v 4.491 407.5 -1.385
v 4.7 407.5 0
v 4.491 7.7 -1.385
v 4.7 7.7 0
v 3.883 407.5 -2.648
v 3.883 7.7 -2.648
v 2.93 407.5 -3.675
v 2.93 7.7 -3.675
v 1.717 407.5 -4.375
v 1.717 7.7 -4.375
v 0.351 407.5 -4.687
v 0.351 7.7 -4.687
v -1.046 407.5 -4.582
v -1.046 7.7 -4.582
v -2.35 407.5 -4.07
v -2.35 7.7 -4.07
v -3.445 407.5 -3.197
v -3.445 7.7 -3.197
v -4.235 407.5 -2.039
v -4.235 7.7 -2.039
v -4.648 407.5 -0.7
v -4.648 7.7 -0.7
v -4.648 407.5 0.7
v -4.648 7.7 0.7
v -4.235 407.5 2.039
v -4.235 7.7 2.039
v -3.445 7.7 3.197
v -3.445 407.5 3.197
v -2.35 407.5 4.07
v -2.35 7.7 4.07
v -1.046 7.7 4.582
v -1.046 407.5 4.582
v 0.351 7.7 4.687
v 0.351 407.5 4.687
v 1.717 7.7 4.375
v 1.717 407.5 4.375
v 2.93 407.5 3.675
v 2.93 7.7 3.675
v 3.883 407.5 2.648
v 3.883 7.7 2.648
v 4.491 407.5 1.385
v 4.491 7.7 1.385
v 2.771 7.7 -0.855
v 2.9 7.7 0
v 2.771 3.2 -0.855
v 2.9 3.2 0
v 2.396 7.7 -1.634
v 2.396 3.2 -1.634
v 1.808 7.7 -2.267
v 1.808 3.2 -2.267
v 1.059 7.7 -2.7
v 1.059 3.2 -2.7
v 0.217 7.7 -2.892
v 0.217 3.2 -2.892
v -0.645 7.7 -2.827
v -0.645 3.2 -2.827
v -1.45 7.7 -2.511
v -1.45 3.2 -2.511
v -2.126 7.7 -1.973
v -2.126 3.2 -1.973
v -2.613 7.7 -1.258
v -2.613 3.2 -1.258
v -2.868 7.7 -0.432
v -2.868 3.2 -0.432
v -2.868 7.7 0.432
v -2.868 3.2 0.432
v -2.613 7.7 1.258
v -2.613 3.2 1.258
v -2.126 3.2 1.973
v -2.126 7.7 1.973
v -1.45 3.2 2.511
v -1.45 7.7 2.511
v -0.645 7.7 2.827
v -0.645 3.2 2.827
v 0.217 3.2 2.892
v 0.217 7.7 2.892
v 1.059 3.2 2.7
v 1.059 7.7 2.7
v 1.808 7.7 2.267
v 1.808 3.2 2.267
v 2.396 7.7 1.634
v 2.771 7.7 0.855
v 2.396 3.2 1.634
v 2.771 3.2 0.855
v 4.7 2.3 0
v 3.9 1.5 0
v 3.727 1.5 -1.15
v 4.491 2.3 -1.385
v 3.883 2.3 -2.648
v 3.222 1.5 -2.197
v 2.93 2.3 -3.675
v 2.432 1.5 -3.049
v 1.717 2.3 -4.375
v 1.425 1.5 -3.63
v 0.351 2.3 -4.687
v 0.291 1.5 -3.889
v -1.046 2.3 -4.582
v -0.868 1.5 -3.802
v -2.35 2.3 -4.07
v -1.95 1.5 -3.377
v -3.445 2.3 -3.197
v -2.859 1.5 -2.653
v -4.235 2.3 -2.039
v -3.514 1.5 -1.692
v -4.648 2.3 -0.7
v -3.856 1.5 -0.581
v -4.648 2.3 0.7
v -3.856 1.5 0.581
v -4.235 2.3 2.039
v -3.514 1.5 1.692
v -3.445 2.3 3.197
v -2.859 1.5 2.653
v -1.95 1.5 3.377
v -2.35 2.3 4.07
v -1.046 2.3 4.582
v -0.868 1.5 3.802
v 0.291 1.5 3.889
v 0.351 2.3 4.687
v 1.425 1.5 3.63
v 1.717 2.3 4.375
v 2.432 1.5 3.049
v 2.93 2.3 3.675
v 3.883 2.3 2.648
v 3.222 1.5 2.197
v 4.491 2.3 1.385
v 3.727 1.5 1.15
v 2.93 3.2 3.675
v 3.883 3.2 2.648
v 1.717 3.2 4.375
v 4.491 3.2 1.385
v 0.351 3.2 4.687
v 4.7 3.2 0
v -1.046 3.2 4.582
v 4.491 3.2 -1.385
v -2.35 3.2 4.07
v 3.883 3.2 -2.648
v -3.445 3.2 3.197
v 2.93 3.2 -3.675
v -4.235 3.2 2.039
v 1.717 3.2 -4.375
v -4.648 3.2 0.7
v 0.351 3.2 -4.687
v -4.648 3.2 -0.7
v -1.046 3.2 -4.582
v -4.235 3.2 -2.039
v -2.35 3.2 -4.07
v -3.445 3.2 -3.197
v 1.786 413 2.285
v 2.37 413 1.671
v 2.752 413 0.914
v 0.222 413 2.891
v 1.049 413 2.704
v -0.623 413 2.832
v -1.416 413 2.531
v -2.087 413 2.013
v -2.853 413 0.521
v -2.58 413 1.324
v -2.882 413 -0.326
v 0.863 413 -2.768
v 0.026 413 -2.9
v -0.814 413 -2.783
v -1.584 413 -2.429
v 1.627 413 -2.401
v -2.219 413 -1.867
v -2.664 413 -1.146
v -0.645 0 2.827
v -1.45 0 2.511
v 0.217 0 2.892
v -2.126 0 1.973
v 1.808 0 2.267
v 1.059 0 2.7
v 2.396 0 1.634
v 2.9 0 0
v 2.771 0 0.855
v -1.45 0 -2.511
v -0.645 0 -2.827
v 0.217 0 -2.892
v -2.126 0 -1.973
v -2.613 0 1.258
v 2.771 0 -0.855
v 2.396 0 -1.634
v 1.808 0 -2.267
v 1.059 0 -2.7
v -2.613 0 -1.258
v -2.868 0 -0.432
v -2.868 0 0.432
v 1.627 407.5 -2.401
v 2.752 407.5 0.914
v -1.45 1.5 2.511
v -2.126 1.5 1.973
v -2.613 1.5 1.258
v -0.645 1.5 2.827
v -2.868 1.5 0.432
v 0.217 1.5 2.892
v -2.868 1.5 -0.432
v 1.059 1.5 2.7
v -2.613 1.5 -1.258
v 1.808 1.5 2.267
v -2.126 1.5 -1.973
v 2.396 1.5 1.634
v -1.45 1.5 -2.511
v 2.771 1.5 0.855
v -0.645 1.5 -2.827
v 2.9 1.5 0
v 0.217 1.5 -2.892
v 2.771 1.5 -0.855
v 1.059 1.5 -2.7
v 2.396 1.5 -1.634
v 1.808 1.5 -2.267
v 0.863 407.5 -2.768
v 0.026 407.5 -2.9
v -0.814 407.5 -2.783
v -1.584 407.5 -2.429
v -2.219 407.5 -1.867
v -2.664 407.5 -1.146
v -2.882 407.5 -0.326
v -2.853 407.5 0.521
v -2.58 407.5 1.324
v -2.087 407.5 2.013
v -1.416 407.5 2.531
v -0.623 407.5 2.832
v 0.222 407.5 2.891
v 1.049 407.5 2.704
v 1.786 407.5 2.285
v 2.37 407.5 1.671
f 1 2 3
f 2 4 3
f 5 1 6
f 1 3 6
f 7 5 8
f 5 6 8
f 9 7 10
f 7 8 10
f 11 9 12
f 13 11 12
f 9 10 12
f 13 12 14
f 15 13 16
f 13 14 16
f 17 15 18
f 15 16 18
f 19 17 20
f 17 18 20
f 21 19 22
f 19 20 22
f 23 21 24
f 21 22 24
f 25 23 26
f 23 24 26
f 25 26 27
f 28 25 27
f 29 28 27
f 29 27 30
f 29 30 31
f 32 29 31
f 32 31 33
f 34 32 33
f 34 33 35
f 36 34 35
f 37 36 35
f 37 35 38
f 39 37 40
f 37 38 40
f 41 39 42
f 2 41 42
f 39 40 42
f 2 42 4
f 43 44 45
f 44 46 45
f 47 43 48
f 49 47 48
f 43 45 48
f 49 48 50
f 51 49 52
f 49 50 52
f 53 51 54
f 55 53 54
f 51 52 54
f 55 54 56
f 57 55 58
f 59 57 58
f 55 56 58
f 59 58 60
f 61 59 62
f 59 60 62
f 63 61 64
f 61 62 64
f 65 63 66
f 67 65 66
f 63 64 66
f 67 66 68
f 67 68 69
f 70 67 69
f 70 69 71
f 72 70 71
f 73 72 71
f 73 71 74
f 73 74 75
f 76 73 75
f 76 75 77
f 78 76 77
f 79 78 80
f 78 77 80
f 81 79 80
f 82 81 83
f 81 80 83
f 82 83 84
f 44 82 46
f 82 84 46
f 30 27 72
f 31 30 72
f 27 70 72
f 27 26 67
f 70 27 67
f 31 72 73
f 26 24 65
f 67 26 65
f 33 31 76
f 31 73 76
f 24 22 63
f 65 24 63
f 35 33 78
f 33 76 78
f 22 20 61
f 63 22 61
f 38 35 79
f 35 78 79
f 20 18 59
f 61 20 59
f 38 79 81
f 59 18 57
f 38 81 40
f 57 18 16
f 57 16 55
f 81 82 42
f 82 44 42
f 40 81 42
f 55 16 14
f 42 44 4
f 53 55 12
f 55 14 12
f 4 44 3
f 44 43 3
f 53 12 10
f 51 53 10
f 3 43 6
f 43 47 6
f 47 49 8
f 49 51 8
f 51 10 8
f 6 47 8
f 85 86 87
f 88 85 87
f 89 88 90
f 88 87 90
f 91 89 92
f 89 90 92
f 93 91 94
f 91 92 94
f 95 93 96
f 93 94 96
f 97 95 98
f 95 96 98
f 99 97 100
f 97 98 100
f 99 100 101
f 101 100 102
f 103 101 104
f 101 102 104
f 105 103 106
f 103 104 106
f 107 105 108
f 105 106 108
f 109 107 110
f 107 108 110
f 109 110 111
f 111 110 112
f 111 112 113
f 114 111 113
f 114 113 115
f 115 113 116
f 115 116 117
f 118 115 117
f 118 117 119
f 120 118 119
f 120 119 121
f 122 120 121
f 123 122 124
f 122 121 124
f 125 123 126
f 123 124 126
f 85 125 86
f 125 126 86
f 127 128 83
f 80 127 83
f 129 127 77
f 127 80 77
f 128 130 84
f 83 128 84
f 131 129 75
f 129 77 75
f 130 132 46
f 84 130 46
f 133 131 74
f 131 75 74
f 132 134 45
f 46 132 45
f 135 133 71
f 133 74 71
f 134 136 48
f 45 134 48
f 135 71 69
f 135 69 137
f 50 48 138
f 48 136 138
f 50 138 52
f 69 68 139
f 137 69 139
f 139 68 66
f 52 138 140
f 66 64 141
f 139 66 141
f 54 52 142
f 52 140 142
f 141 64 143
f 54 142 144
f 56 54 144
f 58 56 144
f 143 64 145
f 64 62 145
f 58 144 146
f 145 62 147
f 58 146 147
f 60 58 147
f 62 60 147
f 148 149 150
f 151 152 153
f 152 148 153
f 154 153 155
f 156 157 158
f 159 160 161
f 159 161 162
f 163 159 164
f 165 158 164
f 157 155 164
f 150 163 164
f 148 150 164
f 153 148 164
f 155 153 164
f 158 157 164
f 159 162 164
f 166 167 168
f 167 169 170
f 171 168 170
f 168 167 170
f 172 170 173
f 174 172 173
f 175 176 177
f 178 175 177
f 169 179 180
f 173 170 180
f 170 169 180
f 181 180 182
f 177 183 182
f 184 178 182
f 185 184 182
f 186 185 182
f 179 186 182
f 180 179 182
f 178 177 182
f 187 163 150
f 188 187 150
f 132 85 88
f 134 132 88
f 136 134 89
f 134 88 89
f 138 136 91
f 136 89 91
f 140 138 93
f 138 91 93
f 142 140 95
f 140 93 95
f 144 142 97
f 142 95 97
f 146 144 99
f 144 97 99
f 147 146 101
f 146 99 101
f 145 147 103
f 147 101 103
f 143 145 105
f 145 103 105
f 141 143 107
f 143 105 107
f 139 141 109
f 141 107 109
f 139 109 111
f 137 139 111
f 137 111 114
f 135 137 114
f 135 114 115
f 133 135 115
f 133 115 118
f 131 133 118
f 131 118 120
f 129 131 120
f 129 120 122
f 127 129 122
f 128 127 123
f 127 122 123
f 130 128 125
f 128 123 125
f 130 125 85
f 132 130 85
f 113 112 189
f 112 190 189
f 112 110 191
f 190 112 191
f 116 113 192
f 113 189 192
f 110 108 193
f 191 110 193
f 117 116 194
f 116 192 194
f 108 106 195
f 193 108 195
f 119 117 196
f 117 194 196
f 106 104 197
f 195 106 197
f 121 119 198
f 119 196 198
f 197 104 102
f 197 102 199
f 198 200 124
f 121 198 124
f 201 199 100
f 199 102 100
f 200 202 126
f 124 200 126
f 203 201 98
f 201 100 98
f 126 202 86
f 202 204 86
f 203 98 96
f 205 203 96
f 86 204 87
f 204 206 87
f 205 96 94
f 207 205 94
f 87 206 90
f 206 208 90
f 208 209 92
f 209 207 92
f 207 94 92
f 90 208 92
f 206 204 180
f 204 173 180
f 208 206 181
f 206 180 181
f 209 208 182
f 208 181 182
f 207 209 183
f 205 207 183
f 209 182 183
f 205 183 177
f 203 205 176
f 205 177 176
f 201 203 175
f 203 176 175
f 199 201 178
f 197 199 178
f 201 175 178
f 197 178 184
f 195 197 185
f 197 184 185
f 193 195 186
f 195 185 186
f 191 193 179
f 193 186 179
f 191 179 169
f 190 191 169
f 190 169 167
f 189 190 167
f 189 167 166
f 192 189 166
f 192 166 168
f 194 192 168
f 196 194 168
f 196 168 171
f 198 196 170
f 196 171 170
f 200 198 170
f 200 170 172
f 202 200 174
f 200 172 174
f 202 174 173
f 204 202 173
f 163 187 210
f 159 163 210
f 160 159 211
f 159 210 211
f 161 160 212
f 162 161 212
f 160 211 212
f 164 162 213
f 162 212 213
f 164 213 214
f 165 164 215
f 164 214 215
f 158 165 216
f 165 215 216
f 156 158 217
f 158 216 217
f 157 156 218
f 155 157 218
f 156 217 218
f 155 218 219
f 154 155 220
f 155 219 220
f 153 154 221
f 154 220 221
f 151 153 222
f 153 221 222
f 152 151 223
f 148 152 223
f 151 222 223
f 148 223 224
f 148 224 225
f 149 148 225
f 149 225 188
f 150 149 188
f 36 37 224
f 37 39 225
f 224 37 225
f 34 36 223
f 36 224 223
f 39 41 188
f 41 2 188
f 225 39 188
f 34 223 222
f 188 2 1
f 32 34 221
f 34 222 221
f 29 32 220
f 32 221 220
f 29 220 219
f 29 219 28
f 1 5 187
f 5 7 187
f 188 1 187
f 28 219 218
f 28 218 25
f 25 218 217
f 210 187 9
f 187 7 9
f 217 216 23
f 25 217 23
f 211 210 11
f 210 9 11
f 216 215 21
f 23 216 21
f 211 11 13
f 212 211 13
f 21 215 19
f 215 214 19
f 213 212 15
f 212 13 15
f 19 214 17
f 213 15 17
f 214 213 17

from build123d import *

# Parameters (mm, degrees)
CHANFREIN1_SIZE         = 0.8
ENL_V_MAT_EXTRU_1_DEPTH = 5.5


with BuildPart() as part:
    # Esquisse1 → Révolution1 (revolve)
    with BuildSketch(Plane.XY):
        Polygon((0, 0), (0, 413), (2.9, 413), (2.9, 407.5), (4.7, 407.5), (4.7, 7.7), (2.9, 7.7), (2.9, 3.2), (4.7, 3.2), (4.7, 1.5), (2.9, 1.5), (2.9, 0), align=None)
    revolve(axis=Axis((0, 0, 0), (0, 1, 0)))

    # Chanfrein1
    chanfrein1_edges = [part.edges().sort_by_distance(p)[0] for p in [
        (-4.7, 1.5, 0),
    ]]
    chamfer(chanfrein1_edges, length=CHANFREIN1_SIZE)

    # Esquisse2 → Enlèv. mat.-Extru.1 (cut)
    with BuildSketch(Plane(origin=(0, 413, 0), x_dir=(1, 0, 0), z_dir=(0, 1, 0))):
        Polygon((1.627133166, 2.400507792), (2.752297905, -0.91370468), (4.646133603, -0.2707534), (3.520968864, 3.043459072), align=None)
    extrude(amount=-ENL_V_MAT_EXTRU_1_DEPTH, mode=Mode.SUBTRACT)


solid = part.part
